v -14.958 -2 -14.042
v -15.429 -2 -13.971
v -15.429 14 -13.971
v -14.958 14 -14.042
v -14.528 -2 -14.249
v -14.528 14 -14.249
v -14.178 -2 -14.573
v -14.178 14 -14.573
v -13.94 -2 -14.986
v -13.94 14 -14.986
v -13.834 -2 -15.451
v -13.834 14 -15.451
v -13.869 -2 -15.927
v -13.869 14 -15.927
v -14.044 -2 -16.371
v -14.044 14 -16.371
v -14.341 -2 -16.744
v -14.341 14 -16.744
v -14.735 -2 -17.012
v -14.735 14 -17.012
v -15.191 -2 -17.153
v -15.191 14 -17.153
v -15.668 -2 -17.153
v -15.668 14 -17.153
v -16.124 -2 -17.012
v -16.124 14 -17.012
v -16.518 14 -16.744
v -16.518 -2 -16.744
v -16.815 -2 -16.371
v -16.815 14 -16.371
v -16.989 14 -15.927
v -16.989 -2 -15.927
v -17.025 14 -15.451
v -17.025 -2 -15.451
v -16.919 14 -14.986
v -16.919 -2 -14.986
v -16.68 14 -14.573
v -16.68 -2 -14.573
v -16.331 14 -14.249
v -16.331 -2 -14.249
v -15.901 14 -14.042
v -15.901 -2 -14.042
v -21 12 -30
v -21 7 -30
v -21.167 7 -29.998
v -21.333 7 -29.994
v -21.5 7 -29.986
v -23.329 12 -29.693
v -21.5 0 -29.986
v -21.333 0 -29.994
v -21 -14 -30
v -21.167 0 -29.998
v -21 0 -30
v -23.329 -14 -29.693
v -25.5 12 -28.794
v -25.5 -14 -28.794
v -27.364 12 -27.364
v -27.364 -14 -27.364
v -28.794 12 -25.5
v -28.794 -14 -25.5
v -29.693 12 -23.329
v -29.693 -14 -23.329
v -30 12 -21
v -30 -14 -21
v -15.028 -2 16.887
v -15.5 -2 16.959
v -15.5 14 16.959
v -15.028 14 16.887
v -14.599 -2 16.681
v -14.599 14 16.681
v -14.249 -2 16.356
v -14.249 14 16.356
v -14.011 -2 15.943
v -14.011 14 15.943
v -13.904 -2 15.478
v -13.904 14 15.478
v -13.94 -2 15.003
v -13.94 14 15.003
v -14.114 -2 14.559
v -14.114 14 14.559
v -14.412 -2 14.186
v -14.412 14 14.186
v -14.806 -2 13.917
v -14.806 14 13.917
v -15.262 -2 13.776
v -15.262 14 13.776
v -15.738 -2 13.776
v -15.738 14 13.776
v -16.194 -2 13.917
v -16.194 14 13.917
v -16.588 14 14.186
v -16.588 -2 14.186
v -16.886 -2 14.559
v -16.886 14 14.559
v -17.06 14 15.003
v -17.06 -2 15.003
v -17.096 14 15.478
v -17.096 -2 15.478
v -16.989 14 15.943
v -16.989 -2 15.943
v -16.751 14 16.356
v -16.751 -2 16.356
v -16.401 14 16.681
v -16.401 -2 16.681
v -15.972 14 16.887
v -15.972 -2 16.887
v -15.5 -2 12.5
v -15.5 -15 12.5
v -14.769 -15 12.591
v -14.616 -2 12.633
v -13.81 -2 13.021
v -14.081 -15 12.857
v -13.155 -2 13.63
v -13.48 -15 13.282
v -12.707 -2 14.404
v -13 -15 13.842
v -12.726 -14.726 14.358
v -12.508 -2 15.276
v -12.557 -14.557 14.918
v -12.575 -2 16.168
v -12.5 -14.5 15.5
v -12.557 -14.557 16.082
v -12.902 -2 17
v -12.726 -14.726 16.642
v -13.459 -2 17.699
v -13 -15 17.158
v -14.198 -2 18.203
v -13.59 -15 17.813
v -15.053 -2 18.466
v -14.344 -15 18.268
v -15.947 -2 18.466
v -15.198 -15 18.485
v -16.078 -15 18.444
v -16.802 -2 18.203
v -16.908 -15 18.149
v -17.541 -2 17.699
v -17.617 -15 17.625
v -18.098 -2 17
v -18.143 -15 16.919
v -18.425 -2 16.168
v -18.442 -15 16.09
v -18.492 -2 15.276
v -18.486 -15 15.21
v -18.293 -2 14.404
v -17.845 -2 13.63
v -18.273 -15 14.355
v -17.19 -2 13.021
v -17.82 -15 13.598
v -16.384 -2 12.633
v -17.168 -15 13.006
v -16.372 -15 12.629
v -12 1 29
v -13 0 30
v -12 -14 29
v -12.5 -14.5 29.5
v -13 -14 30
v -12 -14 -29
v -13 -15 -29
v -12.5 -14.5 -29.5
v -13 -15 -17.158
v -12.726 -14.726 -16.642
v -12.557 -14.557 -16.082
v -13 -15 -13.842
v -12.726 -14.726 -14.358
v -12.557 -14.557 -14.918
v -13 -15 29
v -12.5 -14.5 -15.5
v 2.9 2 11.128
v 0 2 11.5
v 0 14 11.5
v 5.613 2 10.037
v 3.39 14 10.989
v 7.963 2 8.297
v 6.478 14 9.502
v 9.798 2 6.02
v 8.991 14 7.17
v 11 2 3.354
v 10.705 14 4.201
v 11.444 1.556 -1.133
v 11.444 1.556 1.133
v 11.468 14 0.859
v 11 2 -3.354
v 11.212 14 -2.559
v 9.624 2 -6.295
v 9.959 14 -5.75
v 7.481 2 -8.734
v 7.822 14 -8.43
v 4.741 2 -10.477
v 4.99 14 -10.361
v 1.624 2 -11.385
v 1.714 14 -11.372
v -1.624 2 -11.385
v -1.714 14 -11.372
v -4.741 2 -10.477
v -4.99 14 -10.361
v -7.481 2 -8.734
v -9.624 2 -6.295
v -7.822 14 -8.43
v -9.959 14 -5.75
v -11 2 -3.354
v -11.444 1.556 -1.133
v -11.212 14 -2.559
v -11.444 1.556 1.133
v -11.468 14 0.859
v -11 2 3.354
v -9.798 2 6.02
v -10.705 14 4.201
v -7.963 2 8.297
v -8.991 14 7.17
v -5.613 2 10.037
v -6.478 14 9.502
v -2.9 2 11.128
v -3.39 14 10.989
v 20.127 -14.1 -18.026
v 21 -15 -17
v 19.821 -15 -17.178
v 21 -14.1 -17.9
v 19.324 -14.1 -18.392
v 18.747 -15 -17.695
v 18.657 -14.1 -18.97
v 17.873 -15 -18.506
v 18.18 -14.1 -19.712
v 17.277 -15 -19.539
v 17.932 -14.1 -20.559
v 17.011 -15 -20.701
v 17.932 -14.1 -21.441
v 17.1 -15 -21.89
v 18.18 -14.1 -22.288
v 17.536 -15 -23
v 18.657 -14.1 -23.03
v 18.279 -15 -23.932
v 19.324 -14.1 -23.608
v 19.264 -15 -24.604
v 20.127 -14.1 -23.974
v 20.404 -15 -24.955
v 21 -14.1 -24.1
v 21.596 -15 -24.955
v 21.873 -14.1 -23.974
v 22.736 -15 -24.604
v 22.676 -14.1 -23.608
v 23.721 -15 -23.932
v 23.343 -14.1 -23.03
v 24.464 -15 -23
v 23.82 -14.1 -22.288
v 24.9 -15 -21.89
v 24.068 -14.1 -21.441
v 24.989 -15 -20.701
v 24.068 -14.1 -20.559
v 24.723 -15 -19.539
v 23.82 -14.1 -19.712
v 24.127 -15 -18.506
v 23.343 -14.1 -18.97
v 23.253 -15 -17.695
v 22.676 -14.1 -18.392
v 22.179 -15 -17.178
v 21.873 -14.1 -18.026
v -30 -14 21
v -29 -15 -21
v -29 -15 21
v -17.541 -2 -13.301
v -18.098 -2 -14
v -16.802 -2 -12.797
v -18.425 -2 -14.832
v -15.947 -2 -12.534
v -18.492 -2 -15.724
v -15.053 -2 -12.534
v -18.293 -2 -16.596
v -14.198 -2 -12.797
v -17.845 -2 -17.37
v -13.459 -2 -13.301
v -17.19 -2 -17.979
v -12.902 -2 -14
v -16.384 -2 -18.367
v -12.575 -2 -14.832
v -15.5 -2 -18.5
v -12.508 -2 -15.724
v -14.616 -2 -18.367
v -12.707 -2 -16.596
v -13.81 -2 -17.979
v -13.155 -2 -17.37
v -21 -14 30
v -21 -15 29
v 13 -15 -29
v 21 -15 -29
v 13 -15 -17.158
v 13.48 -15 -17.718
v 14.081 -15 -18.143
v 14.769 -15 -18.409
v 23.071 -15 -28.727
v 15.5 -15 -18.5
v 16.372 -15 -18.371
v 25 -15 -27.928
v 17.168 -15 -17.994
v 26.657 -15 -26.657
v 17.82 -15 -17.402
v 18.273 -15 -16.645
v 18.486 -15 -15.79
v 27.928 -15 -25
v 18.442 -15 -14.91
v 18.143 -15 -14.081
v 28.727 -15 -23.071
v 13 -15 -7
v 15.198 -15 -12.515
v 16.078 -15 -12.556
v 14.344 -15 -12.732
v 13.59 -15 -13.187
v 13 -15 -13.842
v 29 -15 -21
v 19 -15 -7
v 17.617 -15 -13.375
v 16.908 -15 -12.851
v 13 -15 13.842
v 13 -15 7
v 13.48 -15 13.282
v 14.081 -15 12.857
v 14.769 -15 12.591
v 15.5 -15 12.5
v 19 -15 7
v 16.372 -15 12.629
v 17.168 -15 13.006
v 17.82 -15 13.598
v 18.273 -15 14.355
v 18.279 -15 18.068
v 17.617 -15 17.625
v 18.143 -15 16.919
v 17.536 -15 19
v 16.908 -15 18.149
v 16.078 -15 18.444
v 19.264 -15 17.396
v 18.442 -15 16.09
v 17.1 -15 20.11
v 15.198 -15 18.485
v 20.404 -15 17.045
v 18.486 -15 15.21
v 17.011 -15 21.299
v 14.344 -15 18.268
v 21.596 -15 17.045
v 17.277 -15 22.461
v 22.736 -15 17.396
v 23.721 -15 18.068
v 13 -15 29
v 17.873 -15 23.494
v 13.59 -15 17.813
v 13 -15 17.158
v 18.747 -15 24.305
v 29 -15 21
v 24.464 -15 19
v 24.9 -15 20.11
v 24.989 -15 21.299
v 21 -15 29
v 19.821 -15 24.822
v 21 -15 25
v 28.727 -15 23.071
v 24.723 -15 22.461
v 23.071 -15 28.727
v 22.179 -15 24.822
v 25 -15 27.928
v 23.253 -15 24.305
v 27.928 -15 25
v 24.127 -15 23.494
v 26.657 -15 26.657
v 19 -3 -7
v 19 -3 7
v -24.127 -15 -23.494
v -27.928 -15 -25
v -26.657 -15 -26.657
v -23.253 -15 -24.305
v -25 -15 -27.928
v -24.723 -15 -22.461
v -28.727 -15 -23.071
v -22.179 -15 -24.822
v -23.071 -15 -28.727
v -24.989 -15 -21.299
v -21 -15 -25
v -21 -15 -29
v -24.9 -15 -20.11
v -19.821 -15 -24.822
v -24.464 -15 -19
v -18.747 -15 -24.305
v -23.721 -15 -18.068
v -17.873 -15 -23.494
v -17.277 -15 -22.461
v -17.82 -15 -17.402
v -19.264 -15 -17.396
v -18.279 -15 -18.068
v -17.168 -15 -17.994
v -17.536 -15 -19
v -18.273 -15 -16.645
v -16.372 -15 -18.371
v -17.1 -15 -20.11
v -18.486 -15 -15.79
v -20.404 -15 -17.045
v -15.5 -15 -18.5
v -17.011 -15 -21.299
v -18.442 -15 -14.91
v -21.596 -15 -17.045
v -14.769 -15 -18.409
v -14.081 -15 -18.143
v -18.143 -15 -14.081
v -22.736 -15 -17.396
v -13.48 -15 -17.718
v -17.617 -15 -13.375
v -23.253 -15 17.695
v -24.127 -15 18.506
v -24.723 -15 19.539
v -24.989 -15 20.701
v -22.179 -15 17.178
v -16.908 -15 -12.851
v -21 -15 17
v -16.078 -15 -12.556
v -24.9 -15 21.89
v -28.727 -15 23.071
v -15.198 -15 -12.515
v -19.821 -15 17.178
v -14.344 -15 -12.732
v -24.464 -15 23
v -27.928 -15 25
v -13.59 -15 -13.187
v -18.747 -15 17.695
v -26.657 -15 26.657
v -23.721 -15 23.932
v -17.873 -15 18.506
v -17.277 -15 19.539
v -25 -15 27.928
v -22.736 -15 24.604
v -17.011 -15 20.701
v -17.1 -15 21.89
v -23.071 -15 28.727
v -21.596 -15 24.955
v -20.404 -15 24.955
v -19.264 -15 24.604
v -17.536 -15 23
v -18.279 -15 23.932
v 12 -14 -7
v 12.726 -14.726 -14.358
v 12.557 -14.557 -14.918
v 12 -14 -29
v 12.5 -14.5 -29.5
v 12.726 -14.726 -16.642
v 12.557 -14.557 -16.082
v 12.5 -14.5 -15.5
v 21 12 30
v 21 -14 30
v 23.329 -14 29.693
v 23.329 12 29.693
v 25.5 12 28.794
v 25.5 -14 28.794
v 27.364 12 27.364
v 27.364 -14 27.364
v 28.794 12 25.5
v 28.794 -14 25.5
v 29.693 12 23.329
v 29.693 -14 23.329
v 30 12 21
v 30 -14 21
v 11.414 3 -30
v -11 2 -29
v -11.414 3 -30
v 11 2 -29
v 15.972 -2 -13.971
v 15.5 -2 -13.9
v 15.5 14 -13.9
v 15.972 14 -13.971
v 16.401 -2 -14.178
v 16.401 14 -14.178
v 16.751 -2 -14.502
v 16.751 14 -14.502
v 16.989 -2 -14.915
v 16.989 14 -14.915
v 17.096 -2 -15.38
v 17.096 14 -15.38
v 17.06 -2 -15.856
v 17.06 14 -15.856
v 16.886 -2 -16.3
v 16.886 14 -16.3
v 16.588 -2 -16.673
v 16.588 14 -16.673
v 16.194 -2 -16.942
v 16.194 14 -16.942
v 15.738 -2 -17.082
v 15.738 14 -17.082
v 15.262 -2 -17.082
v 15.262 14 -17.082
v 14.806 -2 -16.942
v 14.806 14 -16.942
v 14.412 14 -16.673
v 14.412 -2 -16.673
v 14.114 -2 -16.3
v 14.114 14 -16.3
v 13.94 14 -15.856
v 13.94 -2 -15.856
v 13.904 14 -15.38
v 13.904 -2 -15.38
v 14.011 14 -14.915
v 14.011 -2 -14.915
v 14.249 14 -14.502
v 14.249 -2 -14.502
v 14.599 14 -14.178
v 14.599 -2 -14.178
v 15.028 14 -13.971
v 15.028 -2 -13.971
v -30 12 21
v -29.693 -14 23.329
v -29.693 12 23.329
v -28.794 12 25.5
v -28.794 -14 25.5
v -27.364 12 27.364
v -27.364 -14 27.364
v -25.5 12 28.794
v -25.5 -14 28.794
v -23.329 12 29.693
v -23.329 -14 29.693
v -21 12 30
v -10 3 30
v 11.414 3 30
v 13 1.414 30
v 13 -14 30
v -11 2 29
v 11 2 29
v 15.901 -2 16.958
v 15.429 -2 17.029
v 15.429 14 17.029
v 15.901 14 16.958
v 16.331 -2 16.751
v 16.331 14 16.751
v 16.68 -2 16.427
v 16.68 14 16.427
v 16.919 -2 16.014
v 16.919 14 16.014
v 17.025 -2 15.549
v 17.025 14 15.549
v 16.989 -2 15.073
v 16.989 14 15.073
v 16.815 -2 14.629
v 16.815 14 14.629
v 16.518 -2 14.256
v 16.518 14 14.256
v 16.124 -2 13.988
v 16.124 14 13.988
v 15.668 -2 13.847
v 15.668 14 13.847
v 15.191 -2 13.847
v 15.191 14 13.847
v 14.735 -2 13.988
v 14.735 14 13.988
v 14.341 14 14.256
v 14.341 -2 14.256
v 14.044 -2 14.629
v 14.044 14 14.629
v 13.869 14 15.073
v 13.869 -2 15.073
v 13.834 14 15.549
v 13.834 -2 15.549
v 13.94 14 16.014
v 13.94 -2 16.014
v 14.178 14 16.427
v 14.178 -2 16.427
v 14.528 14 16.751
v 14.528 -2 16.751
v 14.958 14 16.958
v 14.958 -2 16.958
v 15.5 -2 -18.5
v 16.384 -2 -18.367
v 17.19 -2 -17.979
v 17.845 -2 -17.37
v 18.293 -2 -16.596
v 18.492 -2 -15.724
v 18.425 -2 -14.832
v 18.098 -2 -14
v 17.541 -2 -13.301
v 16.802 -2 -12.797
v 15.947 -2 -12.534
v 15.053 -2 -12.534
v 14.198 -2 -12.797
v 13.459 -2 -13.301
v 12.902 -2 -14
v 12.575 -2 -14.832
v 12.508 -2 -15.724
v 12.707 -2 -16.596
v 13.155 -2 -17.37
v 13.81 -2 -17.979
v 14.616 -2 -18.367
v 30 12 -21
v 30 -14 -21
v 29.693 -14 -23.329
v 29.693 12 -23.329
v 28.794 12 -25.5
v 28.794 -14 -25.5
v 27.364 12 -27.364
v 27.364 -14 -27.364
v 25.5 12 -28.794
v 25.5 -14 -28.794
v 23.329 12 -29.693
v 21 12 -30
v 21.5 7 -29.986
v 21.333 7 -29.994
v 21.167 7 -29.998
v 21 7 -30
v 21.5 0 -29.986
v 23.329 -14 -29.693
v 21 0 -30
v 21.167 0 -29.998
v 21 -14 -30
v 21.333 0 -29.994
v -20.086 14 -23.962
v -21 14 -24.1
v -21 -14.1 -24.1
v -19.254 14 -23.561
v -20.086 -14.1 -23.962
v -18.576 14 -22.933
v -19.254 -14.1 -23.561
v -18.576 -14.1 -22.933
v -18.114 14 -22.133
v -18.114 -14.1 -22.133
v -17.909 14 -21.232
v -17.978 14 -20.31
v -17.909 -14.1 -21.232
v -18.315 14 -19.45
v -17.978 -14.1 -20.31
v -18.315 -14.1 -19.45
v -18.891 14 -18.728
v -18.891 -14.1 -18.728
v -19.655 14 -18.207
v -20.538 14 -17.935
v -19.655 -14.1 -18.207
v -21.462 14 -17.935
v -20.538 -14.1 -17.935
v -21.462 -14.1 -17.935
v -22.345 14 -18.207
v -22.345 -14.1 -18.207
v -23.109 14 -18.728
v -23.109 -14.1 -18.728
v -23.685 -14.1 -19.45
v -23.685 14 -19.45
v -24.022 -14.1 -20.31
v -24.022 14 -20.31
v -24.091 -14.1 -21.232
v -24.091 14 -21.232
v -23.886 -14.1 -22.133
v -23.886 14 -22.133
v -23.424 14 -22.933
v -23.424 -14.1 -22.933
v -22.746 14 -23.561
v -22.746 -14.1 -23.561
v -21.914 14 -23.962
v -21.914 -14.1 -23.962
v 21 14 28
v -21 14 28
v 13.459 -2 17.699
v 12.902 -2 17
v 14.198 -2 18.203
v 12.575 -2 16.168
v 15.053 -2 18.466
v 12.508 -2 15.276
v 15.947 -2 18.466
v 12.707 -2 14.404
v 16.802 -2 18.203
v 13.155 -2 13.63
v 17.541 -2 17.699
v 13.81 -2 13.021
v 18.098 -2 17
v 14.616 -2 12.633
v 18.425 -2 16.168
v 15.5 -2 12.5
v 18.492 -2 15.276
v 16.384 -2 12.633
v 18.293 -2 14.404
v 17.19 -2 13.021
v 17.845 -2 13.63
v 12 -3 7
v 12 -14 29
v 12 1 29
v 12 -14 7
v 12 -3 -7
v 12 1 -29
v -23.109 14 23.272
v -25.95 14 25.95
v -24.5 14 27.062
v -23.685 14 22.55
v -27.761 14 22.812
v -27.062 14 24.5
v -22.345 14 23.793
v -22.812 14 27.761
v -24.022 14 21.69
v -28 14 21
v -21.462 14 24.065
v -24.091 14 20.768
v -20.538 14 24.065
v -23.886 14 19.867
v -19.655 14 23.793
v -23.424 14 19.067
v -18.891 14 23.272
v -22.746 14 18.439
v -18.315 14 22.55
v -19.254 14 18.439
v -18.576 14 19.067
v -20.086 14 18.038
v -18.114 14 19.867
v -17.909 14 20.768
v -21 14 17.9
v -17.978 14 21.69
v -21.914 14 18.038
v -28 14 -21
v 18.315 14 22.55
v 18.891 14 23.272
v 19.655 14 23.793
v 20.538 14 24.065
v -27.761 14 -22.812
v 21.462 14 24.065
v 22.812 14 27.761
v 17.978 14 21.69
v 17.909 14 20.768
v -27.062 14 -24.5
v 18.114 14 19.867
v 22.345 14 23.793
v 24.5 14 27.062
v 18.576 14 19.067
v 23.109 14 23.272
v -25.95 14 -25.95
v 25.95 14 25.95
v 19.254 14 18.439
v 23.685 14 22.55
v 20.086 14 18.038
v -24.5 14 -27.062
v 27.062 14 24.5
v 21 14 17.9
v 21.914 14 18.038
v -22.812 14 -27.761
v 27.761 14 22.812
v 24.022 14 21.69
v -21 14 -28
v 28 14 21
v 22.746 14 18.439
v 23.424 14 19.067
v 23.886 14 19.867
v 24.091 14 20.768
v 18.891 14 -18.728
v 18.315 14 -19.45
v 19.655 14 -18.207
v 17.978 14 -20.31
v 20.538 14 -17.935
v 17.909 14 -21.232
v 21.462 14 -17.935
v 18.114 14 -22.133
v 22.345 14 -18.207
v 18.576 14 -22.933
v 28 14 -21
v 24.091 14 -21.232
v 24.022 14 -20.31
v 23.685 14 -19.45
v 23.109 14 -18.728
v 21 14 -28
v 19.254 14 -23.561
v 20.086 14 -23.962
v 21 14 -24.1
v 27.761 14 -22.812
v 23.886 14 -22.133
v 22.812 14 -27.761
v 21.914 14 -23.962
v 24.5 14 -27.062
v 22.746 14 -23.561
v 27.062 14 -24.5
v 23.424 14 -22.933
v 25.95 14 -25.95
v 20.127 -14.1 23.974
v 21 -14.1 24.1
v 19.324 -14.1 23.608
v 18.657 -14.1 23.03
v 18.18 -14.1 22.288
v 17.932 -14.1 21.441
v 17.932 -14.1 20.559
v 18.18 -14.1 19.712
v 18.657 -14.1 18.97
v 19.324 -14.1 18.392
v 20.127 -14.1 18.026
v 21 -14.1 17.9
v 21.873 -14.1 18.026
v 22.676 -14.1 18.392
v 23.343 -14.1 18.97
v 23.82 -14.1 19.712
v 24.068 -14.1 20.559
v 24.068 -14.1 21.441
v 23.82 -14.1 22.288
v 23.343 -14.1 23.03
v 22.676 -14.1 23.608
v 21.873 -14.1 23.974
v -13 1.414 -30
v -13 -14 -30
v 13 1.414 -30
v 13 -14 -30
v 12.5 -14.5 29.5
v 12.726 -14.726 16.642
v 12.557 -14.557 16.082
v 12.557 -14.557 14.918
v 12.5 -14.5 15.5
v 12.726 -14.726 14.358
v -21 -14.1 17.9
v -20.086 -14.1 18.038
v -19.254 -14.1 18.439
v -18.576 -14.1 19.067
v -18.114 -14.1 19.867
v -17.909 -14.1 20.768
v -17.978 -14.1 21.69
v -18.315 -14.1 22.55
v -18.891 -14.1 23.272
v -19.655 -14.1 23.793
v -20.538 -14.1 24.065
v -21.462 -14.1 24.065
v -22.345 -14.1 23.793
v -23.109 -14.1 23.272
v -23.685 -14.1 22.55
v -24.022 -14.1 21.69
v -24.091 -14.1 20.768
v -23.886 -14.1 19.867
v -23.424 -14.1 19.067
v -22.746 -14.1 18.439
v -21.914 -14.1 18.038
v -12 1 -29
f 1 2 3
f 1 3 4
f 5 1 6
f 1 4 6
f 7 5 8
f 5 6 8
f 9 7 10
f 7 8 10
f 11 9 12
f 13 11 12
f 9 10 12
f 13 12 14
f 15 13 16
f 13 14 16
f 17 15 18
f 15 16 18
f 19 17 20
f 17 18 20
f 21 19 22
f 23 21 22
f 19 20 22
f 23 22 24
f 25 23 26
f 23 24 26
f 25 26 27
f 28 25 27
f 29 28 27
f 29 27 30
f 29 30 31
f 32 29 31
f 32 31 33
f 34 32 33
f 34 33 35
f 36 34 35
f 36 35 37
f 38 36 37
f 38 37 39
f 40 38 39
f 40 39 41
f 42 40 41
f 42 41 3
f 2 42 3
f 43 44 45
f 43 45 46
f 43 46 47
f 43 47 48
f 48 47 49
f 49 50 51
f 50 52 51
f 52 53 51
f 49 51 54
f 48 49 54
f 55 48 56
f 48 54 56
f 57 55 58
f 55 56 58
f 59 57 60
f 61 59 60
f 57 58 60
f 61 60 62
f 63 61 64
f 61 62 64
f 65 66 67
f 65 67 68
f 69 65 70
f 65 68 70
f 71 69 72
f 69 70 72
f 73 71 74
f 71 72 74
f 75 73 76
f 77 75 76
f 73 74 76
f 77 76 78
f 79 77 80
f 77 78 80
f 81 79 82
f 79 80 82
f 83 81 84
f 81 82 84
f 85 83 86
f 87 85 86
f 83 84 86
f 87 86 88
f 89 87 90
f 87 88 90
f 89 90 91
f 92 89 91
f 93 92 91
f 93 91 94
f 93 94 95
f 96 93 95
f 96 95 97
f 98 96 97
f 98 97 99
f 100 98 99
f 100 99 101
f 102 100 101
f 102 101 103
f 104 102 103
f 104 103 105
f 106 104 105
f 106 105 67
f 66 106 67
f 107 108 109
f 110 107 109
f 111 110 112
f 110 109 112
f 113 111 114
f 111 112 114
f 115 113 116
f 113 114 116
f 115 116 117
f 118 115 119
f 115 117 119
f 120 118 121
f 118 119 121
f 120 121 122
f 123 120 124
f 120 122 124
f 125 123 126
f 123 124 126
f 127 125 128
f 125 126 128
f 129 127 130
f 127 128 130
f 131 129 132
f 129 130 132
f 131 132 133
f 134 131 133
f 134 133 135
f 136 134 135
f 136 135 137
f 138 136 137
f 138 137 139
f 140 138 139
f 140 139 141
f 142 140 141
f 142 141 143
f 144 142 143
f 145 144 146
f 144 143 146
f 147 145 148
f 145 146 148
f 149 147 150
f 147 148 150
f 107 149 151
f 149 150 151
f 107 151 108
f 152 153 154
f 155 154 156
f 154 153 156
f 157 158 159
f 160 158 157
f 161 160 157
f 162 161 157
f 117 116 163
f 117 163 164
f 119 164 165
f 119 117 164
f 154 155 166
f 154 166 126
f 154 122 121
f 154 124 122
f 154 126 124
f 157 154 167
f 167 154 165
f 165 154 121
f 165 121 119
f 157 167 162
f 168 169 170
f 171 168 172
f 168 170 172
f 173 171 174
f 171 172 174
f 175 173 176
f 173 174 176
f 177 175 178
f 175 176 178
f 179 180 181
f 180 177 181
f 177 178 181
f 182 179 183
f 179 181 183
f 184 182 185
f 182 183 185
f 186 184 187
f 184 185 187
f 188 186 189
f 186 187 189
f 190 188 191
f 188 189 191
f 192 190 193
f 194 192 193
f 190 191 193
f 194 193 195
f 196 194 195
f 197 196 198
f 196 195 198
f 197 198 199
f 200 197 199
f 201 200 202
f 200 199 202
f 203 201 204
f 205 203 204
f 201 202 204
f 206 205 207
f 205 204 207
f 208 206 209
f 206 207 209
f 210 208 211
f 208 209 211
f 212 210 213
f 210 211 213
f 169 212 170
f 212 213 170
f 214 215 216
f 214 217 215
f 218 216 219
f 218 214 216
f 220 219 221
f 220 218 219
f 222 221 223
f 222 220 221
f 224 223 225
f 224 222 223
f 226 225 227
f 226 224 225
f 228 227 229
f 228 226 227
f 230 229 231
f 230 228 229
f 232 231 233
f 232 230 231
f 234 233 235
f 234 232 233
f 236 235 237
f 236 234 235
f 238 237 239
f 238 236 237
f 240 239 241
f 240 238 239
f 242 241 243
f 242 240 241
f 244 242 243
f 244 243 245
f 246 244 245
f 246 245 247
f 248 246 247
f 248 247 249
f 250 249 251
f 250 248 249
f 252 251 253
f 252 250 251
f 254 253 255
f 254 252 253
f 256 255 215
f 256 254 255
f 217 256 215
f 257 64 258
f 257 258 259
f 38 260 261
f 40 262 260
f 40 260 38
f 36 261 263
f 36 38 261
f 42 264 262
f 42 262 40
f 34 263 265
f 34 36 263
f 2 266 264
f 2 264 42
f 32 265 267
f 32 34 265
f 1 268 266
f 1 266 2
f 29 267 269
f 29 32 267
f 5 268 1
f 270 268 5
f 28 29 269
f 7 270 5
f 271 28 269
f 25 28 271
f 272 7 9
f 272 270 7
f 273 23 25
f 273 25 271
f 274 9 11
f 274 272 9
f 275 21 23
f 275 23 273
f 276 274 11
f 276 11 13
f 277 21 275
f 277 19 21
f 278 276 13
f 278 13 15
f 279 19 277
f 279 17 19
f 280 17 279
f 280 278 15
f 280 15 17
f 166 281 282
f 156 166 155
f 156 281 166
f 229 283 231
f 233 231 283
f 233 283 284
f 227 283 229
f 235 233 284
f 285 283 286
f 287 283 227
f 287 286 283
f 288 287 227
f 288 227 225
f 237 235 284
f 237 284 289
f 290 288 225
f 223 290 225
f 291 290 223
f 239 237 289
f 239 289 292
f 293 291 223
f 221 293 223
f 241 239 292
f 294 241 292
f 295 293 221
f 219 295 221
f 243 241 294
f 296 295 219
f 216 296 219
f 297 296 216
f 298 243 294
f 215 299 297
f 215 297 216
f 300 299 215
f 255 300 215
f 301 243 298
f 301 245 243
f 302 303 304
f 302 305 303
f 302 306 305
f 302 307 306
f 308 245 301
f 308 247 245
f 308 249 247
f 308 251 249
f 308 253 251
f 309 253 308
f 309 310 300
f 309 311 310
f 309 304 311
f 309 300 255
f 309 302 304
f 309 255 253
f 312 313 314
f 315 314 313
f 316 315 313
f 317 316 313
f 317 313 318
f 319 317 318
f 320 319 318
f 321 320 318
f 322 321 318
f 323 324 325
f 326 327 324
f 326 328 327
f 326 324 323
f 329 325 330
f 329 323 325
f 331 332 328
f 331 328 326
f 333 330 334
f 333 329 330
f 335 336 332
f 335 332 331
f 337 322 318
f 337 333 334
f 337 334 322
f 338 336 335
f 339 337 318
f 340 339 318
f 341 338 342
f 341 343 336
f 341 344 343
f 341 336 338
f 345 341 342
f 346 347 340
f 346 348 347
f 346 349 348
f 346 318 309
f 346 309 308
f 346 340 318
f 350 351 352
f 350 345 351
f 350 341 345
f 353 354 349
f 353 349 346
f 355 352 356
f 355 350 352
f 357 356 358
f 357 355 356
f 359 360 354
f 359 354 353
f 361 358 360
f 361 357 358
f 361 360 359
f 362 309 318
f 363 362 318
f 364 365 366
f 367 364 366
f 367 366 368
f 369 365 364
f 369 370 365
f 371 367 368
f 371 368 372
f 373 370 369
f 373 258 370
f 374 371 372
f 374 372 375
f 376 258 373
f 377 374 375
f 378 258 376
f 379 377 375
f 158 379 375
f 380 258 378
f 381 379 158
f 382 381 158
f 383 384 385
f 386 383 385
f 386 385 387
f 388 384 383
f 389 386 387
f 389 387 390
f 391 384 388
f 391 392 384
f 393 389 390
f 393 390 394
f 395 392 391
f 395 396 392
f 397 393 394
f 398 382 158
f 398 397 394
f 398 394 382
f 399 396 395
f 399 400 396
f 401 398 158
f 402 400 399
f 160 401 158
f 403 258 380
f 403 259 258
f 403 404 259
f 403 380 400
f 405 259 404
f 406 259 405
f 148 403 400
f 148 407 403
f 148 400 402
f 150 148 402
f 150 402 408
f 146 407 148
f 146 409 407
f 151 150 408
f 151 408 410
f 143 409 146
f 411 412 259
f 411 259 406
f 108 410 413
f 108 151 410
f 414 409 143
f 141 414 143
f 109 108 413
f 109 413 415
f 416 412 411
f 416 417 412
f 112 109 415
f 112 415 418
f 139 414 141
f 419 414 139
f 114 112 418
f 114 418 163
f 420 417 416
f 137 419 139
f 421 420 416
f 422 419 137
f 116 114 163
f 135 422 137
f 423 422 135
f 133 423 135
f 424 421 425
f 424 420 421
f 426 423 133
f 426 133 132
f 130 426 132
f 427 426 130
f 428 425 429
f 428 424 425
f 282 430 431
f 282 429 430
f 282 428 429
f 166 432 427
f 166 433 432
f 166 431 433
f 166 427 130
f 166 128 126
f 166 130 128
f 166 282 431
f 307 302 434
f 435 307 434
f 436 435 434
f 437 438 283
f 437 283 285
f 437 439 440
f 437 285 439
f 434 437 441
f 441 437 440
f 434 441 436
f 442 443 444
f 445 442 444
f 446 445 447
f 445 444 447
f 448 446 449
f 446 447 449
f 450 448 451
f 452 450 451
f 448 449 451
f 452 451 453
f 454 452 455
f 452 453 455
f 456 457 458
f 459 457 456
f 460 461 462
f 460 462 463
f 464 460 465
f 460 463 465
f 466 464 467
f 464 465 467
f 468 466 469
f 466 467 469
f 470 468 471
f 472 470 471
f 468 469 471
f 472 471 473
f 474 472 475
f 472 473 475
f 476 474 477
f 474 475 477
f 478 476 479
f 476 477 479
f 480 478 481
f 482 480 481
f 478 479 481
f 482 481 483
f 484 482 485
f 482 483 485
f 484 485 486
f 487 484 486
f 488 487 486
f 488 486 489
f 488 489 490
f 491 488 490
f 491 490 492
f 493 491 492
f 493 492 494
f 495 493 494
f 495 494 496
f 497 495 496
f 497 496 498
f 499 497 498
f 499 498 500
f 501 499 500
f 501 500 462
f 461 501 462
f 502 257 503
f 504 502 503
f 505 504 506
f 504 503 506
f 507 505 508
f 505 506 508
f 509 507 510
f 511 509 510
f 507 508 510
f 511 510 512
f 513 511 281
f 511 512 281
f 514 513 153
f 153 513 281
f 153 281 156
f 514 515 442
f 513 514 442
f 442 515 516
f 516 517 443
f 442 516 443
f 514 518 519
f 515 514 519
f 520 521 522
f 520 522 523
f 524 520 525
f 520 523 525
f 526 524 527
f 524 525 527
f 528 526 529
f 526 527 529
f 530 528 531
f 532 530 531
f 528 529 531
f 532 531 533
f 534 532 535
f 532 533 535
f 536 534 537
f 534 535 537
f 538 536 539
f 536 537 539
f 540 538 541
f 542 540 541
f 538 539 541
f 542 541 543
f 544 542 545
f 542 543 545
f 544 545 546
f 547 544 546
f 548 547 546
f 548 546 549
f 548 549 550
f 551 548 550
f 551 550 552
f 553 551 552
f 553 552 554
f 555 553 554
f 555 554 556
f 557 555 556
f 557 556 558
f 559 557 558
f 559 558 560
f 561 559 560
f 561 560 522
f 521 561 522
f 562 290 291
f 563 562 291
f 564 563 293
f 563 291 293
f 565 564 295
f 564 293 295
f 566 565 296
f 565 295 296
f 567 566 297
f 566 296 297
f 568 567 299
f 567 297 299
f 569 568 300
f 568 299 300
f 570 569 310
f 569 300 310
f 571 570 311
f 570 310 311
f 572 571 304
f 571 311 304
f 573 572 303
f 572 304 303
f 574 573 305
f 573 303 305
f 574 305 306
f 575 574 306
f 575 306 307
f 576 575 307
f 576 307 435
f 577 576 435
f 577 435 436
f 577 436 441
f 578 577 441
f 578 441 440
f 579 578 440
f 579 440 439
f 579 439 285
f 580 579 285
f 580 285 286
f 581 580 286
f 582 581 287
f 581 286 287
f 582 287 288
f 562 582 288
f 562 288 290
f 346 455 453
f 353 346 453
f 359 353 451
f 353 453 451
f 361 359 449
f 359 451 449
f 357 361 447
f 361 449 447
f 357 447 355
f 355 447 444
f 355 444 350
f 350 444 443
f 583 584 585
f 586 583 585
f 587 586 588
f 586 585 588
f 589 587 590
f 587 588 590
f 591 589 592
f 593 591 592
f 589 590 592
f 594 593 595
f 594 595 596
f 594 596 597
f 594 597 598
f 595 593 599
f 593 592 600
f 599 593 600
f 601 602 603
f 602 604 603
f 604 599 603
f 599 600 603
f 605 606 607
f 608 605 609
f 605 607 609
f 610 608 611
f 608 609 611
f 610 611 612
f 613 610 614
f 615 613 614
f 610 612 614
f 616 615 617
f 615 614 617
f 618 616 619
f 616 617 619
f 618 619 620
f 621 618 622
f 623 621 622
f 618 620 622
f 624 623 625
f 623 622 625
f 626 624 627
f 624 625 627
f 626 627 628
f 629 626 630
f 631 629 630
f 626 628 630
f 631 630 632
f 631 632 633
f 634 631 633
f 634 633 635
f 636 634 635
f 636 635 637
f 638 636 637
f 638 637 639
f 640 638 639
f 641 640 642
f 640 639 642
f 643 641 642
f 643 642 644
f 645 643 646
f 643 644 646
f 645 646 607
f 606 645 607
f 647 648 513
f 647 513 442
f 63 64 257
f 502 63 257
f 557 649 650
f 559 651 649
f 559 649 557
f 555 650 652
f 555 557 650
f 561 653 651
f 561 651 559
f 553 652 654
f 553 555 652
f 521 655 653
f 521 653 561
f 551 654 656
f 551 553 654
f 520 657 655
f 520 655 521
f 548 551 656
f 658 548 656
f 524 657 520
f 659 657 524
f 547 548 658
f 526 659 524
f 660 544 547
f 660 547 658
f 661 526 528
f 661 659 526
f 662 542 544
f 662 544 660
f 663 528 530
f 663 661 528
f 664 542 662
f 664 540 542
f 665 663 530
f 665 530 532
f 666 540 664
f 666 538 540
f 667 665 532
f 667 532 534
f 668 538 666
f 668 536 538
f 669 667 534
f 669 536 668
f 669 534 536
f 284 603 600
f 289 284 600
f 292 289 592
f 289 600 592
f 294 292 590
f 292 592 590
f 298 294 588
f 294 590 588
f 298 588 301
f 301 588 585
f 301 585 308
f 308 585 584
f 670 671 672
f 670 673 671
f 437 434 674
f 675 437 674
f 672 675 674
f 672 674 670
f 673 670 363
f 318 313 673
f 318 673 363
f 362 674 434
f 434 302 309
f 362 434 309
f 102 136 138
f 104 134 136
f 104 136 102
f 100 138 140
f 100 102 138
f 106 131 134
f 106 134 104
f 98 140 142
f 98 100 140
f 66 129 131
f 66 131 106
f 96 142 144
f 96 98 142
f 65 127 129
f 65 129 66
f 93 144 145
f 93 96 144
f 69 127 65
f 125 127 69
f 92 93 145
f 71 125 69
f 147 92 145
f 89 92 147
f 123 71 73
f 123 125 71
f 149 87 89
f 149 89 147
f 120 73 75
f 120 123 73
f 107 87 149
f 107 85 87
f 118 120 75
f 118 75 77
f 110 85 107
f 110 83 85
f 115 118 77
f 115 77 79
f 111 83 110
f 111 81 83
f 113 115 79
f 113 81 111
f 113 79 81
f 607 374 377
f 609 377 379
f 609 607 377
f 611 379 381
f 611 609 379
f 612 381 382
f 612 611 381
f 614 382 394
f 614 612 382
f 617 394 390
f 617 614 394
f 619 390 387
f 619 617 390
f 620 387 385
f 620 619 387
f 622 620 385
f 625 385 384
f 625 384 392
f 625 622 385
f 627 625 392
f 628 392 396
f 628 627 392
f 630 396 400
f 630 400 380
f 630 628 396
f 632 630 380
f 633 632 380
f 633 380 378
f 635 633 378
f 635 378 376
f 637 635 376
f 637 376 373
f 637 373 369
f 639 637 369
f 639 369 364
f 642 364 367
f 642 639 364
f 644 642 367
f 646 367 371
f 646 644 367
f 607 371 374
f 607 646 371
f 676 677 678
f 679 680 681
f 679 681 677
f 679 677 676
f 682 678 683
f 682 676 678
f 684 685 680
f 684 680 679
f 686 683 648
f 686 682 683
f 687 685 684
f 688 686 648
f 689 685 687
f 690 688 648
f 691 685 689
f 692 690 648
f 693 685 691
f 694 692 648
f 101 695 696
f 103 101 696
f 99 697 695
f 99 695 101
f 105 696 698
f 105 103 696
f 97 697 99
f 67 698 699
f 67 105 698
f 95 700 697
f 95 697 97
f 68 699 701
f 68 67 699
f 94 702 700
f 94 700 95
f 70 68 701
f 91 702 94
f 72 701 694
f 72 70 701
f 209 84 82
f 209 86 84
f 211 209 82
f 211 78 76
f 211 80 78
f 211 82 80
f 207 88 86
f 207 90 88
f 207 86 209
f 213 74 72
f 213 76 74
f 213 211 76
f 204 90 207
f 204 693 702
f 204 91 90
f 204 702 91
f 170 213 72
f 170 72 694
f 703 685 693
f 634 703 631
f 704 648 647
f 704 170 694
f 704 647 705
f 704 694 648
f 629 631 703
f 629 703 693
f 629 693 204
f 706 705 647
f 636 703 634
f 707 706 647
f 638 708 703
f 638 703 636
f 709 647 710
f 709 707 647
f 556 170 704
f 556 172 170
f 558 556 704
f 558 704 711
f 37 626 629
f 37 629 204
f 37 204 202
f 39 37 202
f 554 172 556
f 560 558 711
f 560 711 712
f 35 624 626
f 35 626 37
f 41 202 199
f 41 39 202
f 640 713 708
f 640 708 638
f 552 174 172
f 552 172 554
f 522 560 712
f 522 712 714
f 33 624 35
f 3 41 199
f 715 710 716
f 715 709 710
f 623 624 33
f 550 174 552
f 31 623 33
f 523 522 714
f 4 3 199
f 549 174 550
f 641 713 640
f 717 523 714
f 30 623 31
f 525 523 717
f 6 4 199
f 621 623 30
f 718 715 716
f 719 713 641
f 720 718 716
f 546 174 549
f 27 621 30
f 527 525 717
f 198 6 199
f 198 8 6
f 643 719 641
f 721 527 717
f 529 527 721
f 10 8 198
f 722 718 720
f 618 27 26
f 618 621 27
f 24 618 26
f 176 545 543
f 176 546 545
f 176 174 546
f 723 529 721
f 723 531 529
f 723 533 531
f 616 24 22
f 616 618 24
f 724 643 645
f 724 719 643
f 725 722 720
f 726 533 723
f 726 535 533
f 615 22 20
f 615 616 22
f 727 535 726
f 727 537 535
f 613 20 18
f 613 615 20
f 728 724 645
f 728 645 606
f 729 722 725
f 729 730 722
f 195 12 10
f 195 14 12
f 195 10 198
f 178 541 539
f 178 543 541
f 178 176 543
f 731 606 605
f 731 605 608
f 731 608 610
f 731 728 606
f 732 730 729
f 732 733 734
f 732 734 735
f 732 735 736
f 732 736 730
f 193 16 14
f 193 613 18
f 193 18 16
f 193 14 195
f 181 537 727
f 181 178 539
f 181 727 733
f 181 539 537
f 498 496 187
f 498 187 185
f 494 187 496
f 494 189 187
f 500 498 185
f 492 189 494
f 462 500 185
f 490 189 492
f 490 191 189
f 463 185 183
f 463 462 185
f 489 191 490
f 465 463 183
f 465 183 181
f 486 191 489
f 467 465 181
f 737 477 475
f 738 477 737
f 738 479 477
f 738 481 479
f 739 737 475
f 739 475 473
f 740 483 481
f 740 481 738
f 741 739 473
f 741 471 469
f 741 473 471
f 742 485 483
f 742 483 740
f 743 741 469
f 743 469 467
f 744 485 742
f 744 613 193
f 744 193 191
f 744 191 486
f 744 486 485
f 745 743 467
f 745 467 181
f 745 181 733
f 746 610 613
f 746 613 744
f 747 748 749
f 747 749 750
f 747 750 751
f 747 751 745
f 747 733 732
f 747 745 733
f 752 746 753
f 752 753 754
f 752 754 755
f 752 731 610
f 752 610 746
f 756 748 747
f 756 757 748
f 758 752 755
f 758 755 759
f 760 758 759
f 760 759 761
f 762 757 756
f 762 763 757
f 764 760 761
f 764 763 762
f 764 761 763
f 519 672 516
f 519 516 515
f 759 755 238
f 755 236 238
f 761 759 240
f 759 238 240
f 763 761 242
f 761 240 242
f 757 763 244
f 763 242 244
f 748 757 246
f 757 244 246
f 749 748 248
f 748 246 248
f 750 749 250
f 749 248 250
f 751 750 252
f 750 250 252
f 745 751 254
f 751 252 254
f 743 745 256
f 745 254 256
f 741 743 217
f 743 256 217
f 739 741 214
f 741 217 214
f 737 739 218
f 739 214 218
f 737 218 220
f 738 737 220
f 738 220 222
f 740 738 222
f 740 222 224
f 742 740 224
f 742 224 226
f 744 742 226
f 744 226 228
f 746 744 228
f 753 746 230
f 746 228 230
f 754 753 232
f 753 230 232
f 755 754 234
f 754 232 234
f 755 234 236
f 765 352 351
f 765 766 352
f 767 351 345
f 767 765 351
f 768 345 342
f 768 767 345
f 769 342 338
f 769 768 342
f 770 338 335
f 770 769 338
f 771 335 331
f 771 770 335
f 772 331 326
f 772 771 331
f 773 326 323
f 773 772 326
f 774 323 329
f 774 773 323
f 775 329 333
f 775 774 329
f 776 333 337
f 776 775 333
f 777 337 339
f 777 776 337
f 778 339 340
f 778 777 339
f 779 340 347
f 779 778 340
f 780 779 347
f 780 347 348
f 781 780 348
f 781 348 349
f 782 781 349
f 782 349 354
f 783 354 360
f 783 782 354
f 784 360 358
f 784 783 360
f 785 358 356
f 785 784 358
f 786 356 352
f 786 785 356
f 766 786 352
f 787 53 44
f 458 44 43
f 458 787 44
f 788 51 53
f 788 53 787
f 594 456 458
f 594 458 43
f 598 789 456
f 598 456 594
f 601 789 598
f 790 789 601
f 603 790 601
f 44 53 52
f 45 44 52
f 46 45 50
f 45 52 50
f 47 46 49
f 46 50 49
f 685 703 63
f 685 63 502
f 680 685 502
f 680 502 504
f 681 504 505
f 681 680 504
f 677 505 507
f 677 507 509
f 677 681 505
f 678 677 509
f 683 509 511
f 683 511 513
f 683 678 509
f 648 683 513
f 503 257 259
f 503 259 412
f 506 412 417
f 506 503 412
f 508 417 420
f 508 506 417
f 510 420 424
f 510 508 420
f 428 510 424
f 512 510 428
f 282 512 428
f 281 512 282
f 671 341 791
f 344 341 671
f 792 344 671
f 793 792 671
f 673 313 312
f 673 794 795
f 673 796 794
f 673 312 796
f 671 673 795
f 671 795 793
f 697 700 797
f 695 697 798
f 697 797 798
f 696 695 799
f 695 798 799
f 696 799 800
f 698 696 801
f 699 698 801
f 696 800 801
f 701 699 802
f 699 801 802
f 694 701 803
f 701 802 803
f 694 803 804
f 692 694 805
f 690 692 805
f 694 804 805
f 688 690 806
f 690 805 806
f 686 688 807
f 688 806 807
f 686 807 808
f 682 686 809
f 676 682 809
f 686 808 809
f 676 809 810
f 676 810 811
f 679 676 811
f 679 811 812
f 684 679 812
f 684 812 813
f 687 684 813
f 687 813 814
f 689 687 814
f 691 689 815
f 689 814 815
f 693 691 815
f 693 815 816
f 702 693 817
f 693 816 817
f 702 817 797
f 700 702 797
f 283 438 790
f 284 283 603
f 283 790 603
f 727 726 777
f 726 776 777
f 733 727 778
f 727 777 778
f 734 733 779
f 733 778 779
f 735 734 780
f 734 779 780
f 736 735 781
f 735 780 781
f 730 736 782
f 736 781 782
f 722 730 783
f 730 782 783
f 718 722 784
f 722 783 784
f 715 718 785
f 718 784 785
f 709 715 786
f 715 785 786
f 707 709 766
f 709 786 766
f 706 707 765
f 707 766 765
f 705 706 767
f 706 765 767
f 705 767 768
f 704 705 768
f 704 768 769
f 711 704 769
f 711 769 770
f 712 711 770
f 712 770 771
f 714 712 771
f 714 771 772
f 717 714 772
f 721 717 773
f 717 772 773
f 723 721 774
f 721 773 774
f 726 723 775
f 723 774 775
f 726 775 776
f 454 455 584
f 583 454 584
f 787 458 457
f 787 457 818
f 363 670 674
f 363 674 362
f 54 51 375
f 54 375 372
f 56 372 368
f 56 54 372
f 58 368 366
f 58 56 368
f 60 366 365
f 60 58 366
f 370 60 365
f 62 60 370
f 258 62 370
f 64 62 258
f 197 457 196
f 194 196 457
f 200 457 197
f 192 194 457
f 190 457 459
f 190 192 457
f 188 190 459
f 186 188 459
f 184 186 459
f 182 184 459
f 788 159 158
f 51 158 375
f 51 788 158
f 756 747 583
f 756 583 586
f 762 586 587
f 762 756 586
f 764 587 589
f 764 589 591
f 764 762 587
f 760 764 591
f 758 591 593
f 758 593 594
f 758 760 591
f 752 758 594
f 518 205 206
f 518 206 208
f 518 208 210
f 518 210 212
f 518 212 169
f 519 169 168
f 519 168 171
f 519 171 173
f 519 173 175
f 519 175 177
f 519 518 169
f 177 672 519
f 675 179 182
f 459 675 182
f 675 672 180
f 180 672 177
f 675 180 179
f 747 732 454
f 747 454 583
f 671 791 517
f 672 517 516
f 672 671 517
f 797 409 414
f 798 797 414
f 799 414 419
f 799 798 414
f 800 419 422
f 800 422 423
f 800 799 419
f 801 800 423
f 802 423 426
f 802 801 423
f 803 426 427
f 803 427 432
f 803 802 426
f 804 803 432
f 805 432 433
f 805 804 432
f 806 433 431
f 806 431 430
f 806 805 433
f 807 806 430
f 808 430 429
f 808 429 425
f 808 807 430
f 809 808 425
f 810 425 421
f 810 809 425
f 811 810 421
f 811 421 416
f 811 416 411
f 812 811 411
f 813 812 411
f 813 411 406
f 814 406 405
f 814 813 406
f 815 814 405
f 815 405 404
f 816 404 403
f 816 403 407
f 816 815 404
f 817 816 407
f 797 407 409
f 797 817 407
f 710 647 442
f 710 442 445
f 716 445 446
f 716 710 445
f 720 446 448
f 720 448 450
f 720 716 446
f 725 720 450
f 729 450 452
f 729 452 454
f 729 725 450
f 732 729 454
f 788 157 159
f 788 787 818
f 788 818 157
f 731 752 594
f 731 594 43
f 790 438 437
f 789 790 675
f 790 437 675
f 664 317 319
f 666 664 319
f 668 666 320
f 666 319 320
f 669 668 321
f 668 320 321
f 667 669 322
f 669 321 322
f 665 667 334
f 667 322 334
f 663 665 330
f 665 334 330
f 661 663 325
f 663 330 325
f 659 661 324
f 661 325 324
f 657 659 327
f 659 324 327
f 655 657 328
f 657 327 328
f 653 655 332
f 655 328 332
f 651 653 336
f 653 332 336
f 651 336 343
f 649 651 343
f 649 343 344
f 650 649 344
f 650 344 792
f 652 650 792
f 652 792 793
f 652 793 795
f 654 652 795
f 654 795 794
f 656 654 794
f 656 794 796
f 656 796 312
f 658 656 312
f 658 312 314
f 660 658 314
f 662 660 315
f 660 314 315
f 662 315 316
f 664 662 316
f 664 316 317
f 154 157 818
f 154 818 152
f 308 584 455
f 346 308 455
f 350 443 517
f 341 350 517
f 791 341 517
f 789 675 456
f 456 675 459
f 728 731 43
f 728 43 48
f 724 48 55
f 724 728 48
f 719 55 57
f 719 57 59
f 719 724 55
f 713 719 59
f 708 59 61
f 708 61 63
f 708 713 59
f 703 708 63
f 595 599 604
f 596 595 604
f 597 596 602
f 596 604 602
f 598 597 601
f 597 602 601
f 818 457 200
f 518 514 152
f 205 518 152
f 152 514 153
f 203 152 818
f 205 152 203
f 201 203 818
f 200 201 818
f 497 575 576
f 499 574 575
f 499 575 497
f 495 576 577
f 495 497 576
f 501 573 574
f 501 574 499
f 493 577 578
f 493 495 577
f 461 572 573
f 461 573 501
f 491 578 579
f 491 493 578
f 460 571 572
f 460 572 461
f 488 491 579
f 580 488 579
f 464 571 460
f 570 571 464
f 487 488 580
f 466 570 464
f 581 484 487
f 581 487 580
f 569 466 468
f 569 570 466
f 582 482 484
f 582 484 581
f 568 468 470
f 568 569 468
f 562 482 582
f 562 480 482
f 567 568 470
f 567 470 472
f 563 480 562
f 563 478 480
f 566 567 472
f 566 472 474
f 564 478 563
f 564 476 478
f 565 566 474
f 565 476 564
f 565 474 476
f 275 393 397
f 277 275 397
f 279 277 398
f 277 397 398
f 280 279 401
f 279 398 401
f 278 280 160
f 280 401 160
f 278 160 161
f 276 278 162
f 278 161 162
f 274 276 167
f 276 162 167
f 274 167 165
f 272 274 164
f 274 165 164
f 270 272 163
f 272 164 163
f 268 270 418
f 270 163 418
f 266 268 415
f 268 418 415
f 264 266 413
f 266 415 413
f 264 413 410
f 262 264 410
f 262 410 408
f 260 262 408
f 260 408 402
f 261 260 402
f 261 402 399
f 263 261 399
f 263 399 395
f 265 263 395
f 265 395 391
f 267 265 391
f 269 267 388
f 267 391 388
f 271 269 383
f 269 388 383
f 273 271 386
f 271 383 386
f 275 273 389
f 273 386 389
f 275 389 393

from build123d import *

# Parameters (mm, degrees)
SKETCH_1_W           = 60
SKETCH_1_H           = 60
EXTRUDE_1_DEPTH      = 7
SKETCH_2_W           = 18
SKETCH_2_H           = 60
SKETCH_2_R           = 3
EXTRUDE_2_DEPTH      = 15
SKETCH_3_W           = 43
SKETCH_3_H           = 70
CUT_EXTRUDE_1_DEPTH  = 7
SKETCH_4_W           = 24
SKETCH_4_H           = 60
EXTRUDE_3_DEPTH      = 15
SKETCH_12_W          = 24
SKETCH_12_H          = 12
CUT_EXTRUDE_8_DEPTH  = 87
FILLET_START         = -16
FILLET_8_DEPTH       = 24
CHAMFER_23_SIZE      = 1
CHAMFER_24_SIZE      = 1
EXTRUDE_4_DEPTH      = 7
EXTRUDE_5_DEPTH      = 7
SKETCH_23_W          = 24
SKETCH_23_H          = 60
CUT_EXTRUDE_9_DEPTH  = 11
SKETCH_24_R          = 11.5
SKETCH_24_R_2        = 1.6
CUT_EXTRUDE_10_DEPTH = 34
SKETCH_25_R          = 3
CUT_EXTRUDE_11_DEPTH = 3
CHAMFER_25_SIZE      = 2
CHAMFER_26_SIZE      = 1
CHAMFER_27_SIZE      = 1
CHAMFER_28_SIZE      = 1
SKETCH_26_W          = 14
SKETCH_26_H          = 14
CUT_EXTRUDE_12_DEPTH = 12
SKETCH_28_R          = 3.1
CUT_EXTRUDE_13_DEPTH = 15
SKETCH_30_R          = 3
CUT_EXTRUDE_14_DEPTH = 10
SKETCH_31_R          = 3.1
CUT_EXTRUDE_15_DEPTH = 35


with BuildPart() as part:
    # 草图1 → 凸台-拉伸1 (new body)
    with BuildSketch(Plane(origin=(0, 0, 0), x_dir=(1, 0, 0), z_dir=(0, 1, 0))):
        Rectangle(SKETCH_1_W, SKETCH_1_H)
    extrude(amount=EXTRUDE_1_DEPTH)

    # 草图2 → 凸台-拉伸2 (add)
    # profile 1 of 2: a face of its own
    with BuildSketch(Plane.XZ):
        with Locations((-21, 0)):
            Rectangle(SKETCH_2_W, SKETCH_2_H)
        with Locations(Location((-21, 21, 0), (0, 0, 270))):
            Circle(SKETCH_2_R, mode=Mode.SUBTRACT)
        with Locations(Location((-21, -21, 0), (0, 0, 270))):
            Circle(SKETCH_2_R, mode=Mode.SUBTRACT)
    # profile 2 of 2: a face of its own
    with BuildSketch(Plane.XZ):
        with Locations((21, 0)):
            Rectangle(SKETCH_2_W, SKETCH_2_H)
        with Locations(Location((21, -21, 0), (0, 0, 90))):
            Circle(SKETCH_2_R, mode=Mode.SUBTRACT)
        with Locations(Location((21, 21, 0), (0, 0, 90))):
            Circle(SKETCH_2_R, mode=Mode.SUBTRACT)
    extrude(amount=EXTRUDE_2_DEPTH)

    # 草图3 → 切除-拉伸1 (cut)
    with BuildSketch(Plane(origin=(0, 7, 0), x_dir=(1, 0, 0), z_dir=(0, 1, 0))):
        with Locations((0, 30)):
            Rectangle(SKETCH_3_W, SKETCH_3_H)
    extrude(amount=-CUT_EXTRUDE_1_DEPTH, mode=Mode.SUBTRACT)

    # 草图4 → 凸台-拉伸3 (add)
    with BuildSketch(Plane.XZ):
        Rectangle(SKETCH_4_W, SKETCH_4_H)
    extrude(amount=EXTRUDE_3_DEPTH)

    # 草图12 → 切除-拉伸8 (cut)
    with BuildSketch(Plane(origin=(0, 0, -30), x_dir=(-1, 0, 0), z_dir=(0, 0, -1))):
        with Locations((0, -15)):
            Rectangle(SKETCH_12_W, SKETCH_12_H)
    extrude(amount=-CUT_EXTRUDE_8_DEPTH, mode=Mode.SUBTRACT)

    # 圆角8: read off the stored shape, not the designer's step
    # 圆角8 outline → 圆角8 (cut)
    with BuildSketch(Plane(origin=(0, 0, 0), x_dir=(1, 0, 0), z_dir=(0, 1, 0)).offset(FILLET_START)):
        with BuildLine():
            Line((-30, 30), (-30, 21))
            ThreePointArc((-30, 21), (-27.363961031, 27.363961031), (-21, 30))
            Line((-21, 30), (-30, 30))
        make_face()
        with BuildLine():
            ThreePointArc((-21, -30), (-27.363961031, -27.363961031), (-30, -21))
            Line((-30, -21), (-30, -30))
            Line((-30, -30), (-21, -30))
        make_face()
        with BuildLine():
            Line((30, 30), (21, 30))
            ThreePointArc((21, 30), (27.363961031, 27.363961031), (30, 21))
            Line((30, 21), (30, 30))
        make_face()
        with BuildLine():
            ThreePointArc((30, -21), (27.363961031, -27.363961031), (21, -30))
            Line((21, -30), (30, -30))
            Line((30, -30), (30, -21))
        make_face()
    extrude(amount=FILLET_8_DEPTH, mode=Mode.SUBTRACT)

    # 倒角23
    chamfer_23_edges = [part.edges().sort_by_distance(p)[0] for p in [
        (-21, -15, 24),
        (-21, -15, -18),
        (21, -15, -24),
        (21, -15, 18),
    ]]
    chamfer(chamfer_23_edges, length=CHAMFER_23_SIZE)

    # 倒角24
    chamfer_24_edges = [part.edges().sort_by_distance(p)[0] for p in [
        (-30, -15, 0),
        (-16.5, -15, -30),
        (-27.363961031, -15, 27.363961031),
        (-27.363961031, -15, -27.363961031),
        (30, -15, 0),
        (16.5, -15, 30),
        (27.363961031, -15, 27.363961031),
        (27.363961031, -15, -27.363961031),
        (16.5, -15, -30),
        (-16.5, -15, 30),
    ]]
    chamfer(chamfer_24_edges, length=CHAMFER_24_SIZE)

    # 草图21 → 凸台-拉伸4 (add)
    with BuildSketch(Plane(origin=(0, 0, 0), x_dir=(1, 0, 0), z_dir=(0, 1, 0))):
        with BuildLine():
            Line((-21.5, 23.958039892), (-21.5, 18.041960108))
            Line((-21.5, 18.041960108), (-21.5, -5))
            Line((-21.5, -5), (21.5, -5))
            Line((21.5, -5), (21.5, 18.041960108))
            Line((21.5, 18.041960108), (21.5, 23.958039892))
            Line((21.5, 23.958039892), (21.5, 29.986100378))
            ThreePointArc((21.5, 29.986100378), (21.250096581, 29.996524423), (21, 30))
            Line((21, 30), (-21, 30))
            ThreePointArc((-21, 30), (-21.250096581, 29.996524423), (-21.5, 29.986100378))
            Line((-21.5, 29.986100378), (-21.5, 23.958039892))
        make_face()
    extrude(amount=EXTRUDE_4_DEPTH)

    # 草图22 → 凸台-拉伸5 (add)
    with BuildSketch(Plane(origin=(0, 7, 0), x_dir=(1, 0, 0), z_dir=(0, 1, 0))):
        with BuildLine():
            Line((21, 30), (-21, 30))
            ThreePointArc((-21, 30), (-27.363961031, 27.363961031), (-30, 21))
            Line((-30, 21), (-30, -21))
            ThreePointArc((-30, -21), (-27.363961031, -27.363961031), (-21, -30))
            Line((-21, -30), (21, -30))
            ThreePointArc((21, -30), (27.363961031, -27.363961031), (30, -21))
            Line((30, -21), (30, 21))
            ThreePointArc((30, 21), (27.363961031, 27.363961031), (21, 30))
        make_face()
    extrude(amount=EXTRUDE_5_DEPTH)

    # 草图23 → 切除-拉伸9 (cut)
    with BuildSketch(Plane.XZ.offset(9)):
        Rectangle(SKETCH_23_W, SKETCH_23_H)
    extrude(amount=-CUT_EXTRUDE_9_DEPTH, mode=Mode.SUBTRACT)

    # 草图24 → 切除-拉伸10 (cut)
    with BuildSketch(Plane(origin=(0, 14, 0), x_dir=(1, 0, 0), z_dir=(0, 1, 0))):
        with Locations(Location((0, 0, 0), (0, 0, 270))):
            Circle(SKETCH_24_R)
        with Locations(Location((15.5, 15.5, 0), (0, 0, 270))):
            Circle(SKETCH_24_R_2)
        with Locations(Location((15.429289322, -15.429289322, 0), (0, 0, 270))):
            Circle(SKETCH_24_R_2)
        with Locations(Location((-15.5, -15.358578644, 0), (0, 0, 270))):
            Circle(SKETCH_24_R_2)
        with Locations(Location((-15.429289322, 15.570710678, 0), (0, 0, 270))):
            Circle(SKETCH_24_R_2)
    extrude(amount=-CUT_EXTRUDE_10_DEPTH, mode=Mode.SUBTRACT)

    # 草图25 → 切除-拉伸11 (cut)
    with BuildSketch(Plane.XZ.offset(15)):
        with Locations(Location((15.5, -15.5, 0), (0, 0, 270))):
            Circle(SKETCH_25_R)
        with Locations(Location((-15.5, -15.5, 0), (0, 0, 270))):
            Circle(SKETCH_25_R)
        with Locations(Location((-15.5, 15.5, 0), (0, 0, 270))):
            Circle(SKETCH_25_R)
        with Locations(Location((15.5, 15.5, 0), (0, 0, 270))):
            Circle(SKETCH_25_R)
    extrude(amount=-CUT_EXTRUDE_11_DEPTH, mode=Mode.SUBTRACT)

    # 倒角25
    chamfer_25_edges = [part.edges().sort_by_distance(p)[0] for p in [
        (27.363961031, 14, -27.363961031),
        (0, 14, -30),
        (-27.363961031, 14, -27.363961031),
        (-30, 14, 0),
        (-27.363961031, 14, 27.363961031),
        (0, 14, 30),
        (27.363961031, 14, 27.363961031),
        (30, 14, 0),
    ]]
    chamfer(chamfer_25_edges, length=CHAMFER_25_SIZE)

    # 倒角26
    # the kernel refuses this chamfer: 1 mm, written as the material it adds along each edge
    with BuildSketch(Plane(origin=(12, 2, -30), x_dir=(0, -1, 0), z_dir=(0, 0, 1))) as chamfer_26_piece_1_section:
        Polygon((CHAMFER_26_SIZE, 0), (0, -CHAMFER_26_SIZE), (0, 0), align=None)
    chamfer_26_piece_1 = extrude(amount=60, mode=Mode.PRIVATE)
    chamfer_26_piece_1 = chamfer_26_piece_1 - Plane(origin=(0, 2, 0), x_dir=(0, 0, 1), z_dir=(0, 1, 0)) * Cylinder(11.5, 124, mode=Mode.PRIVATE)
    add(chamfer_26_piece_1)
    with BuildSketch(Plane(origin=(-12, 2, 30), x_dir=(1, 0, 0), z_dir=(0, 0, -1))) as chamfer_26_piece_2_section:
        Polygon((CHAMFER_26_SIZE, 0), (0, CHAMFER_26_SIZE), (0, 0), align=None)
    chamfer_26_piece_2 = extrude(amount=60, mode=Mode.PRIVATE)
    chamfer_26_piece_2 = chamfer_26_piece_2 - Plane(origin=(0, 2, 0), x_dir=(0, 0, 1), z_dir=(0, 1, 0)) * Cylinder(11.5, 124, mode=Mode.PRIVATE)
    add(chamfer_26_piece_2)
    # the kernel refuses this chamfer: 1 mm, written as the material it takes off along each edge
    with BuildSketch(Plane(origin=(-12, -15, 31.571682988), x_dir=(-1, 0, 0), z_dir=(0, 0, -1)), Plane(origin=(12, -15, -31.571682988), x_dir=(1, 0, 0), z_dir=(0, 0, 1))) as chamfer_26_2_piece_1:
        Polygon((CHAMFER_26_SIZE, 0), (0, CHAMFER_26_SIZE), (0, 0), align=None)
    extrude(amount=63.143365976, mode=Mode.SUBTRACT)

    # 倒角27
    chamfer_27_edges = [part.edges().sort_by_distance(p)[0] for p in [
        (-12, -6.5, -30),
        (0, 2, -30),
        (12, -6.5, -30),
        (11.5, 1.5, -30),
        (-11.5, 1.5, -30),
    ]]
    chamfer(chamfer_27_edges, length=CHAMFER_27_SIZE)

    # 倒角28
    chamfer_28_edges = [part.edges().sort_by_distance(p)[0] for p in [
        (-12, -6.5, 30),
        (0, 2, 30),
        (12, -6.5, 30),
        (11.5, 1.5, 30),
    ]]
    chamfer(chamfer_28_edges, length=CHAMFER_28_SIZE)

    # 草图26 → 切除-拉伸12 (cut)
    with BuildSketch(Plane.XZ.offset(15)):
        with Locations((12, 0)):
            Rectangle(SKETCH_26_W, SKETCH_26_H)
    extrude(amount=-CUT_EXTRUDE_12_DEPTH, mode=Mode.SUBTRACT)

    # 草图28 → 切除-拉伸13 (cut)
    with BuildSketch(Plane.XZ.offset(15)):
        with Locations(Location((-21, 21, 0), (0, 0, 270))):
            Circle(SKETCH_28_R)
        with Locations(Location((21, 21, 0), (0, 0, 270))):
            Circle(SKETCH_28_R)
        with Locations(Location((21, -21, 0), (0, 0, 270))):
            Circle(SKETCH_28_R)
        with Locations(Location((-21, -21, 0), (0, 0, 270))):
            Circle(SKETCH_28_R)
    extrude(amount=-CUT_EXTRUDE_13_DEPTH, mode=Mode.SUBTRACT)

    # 草图30 → 切除-拉伸14 (cut)
    with BuildSketch(Plane.XZ.offset(12)):
        with Locations(Location((-15.5, 15.5, 0), (0, 0, 270))):
            Circle(SKETCH_30_R)
        with Locations(Location((15.5, 15.5, 0), (0, 0, 270))):
            Circle(SKETCH_30_R)
        with Locations(Location((15.5, -15.5, 0), (0, 0, 270))):
            Circle(SKETCH_30_R)
        with Locations(Location((-15.5, -15.5, 0), (0, 0, 270))):
            Circle(SKETCH_30_R)
    extrude(amount=-CUT_EXTRUDE_14_DEPTH, mode=Mode.SUBTRACT)

    # 草图31 → 切除-拉伸15 (cut)
    with BuildSketch(Plane.XZ):
        with Locations(Location((-21, 21, 0), (0, 0, 270))):
            Circle(SKETCH_31_R)
        with Locations(Location((21, 21, 0), (0, 0, 270))):
            Circle(SKETCH_31_R)
        with Locations(Location((21, -21, 0), (0, 0, 270))):
            Circle(SKETCH_31_R)
        with Locations(Location((-21, -21, 0), (0, 0, 270))):
            Circle(SKETCH_31_R)
    extrude(amount=-CUT_EXTRUDE_15_DEPTH, mode=Mode.SUBTRACT)


solid = part.part
